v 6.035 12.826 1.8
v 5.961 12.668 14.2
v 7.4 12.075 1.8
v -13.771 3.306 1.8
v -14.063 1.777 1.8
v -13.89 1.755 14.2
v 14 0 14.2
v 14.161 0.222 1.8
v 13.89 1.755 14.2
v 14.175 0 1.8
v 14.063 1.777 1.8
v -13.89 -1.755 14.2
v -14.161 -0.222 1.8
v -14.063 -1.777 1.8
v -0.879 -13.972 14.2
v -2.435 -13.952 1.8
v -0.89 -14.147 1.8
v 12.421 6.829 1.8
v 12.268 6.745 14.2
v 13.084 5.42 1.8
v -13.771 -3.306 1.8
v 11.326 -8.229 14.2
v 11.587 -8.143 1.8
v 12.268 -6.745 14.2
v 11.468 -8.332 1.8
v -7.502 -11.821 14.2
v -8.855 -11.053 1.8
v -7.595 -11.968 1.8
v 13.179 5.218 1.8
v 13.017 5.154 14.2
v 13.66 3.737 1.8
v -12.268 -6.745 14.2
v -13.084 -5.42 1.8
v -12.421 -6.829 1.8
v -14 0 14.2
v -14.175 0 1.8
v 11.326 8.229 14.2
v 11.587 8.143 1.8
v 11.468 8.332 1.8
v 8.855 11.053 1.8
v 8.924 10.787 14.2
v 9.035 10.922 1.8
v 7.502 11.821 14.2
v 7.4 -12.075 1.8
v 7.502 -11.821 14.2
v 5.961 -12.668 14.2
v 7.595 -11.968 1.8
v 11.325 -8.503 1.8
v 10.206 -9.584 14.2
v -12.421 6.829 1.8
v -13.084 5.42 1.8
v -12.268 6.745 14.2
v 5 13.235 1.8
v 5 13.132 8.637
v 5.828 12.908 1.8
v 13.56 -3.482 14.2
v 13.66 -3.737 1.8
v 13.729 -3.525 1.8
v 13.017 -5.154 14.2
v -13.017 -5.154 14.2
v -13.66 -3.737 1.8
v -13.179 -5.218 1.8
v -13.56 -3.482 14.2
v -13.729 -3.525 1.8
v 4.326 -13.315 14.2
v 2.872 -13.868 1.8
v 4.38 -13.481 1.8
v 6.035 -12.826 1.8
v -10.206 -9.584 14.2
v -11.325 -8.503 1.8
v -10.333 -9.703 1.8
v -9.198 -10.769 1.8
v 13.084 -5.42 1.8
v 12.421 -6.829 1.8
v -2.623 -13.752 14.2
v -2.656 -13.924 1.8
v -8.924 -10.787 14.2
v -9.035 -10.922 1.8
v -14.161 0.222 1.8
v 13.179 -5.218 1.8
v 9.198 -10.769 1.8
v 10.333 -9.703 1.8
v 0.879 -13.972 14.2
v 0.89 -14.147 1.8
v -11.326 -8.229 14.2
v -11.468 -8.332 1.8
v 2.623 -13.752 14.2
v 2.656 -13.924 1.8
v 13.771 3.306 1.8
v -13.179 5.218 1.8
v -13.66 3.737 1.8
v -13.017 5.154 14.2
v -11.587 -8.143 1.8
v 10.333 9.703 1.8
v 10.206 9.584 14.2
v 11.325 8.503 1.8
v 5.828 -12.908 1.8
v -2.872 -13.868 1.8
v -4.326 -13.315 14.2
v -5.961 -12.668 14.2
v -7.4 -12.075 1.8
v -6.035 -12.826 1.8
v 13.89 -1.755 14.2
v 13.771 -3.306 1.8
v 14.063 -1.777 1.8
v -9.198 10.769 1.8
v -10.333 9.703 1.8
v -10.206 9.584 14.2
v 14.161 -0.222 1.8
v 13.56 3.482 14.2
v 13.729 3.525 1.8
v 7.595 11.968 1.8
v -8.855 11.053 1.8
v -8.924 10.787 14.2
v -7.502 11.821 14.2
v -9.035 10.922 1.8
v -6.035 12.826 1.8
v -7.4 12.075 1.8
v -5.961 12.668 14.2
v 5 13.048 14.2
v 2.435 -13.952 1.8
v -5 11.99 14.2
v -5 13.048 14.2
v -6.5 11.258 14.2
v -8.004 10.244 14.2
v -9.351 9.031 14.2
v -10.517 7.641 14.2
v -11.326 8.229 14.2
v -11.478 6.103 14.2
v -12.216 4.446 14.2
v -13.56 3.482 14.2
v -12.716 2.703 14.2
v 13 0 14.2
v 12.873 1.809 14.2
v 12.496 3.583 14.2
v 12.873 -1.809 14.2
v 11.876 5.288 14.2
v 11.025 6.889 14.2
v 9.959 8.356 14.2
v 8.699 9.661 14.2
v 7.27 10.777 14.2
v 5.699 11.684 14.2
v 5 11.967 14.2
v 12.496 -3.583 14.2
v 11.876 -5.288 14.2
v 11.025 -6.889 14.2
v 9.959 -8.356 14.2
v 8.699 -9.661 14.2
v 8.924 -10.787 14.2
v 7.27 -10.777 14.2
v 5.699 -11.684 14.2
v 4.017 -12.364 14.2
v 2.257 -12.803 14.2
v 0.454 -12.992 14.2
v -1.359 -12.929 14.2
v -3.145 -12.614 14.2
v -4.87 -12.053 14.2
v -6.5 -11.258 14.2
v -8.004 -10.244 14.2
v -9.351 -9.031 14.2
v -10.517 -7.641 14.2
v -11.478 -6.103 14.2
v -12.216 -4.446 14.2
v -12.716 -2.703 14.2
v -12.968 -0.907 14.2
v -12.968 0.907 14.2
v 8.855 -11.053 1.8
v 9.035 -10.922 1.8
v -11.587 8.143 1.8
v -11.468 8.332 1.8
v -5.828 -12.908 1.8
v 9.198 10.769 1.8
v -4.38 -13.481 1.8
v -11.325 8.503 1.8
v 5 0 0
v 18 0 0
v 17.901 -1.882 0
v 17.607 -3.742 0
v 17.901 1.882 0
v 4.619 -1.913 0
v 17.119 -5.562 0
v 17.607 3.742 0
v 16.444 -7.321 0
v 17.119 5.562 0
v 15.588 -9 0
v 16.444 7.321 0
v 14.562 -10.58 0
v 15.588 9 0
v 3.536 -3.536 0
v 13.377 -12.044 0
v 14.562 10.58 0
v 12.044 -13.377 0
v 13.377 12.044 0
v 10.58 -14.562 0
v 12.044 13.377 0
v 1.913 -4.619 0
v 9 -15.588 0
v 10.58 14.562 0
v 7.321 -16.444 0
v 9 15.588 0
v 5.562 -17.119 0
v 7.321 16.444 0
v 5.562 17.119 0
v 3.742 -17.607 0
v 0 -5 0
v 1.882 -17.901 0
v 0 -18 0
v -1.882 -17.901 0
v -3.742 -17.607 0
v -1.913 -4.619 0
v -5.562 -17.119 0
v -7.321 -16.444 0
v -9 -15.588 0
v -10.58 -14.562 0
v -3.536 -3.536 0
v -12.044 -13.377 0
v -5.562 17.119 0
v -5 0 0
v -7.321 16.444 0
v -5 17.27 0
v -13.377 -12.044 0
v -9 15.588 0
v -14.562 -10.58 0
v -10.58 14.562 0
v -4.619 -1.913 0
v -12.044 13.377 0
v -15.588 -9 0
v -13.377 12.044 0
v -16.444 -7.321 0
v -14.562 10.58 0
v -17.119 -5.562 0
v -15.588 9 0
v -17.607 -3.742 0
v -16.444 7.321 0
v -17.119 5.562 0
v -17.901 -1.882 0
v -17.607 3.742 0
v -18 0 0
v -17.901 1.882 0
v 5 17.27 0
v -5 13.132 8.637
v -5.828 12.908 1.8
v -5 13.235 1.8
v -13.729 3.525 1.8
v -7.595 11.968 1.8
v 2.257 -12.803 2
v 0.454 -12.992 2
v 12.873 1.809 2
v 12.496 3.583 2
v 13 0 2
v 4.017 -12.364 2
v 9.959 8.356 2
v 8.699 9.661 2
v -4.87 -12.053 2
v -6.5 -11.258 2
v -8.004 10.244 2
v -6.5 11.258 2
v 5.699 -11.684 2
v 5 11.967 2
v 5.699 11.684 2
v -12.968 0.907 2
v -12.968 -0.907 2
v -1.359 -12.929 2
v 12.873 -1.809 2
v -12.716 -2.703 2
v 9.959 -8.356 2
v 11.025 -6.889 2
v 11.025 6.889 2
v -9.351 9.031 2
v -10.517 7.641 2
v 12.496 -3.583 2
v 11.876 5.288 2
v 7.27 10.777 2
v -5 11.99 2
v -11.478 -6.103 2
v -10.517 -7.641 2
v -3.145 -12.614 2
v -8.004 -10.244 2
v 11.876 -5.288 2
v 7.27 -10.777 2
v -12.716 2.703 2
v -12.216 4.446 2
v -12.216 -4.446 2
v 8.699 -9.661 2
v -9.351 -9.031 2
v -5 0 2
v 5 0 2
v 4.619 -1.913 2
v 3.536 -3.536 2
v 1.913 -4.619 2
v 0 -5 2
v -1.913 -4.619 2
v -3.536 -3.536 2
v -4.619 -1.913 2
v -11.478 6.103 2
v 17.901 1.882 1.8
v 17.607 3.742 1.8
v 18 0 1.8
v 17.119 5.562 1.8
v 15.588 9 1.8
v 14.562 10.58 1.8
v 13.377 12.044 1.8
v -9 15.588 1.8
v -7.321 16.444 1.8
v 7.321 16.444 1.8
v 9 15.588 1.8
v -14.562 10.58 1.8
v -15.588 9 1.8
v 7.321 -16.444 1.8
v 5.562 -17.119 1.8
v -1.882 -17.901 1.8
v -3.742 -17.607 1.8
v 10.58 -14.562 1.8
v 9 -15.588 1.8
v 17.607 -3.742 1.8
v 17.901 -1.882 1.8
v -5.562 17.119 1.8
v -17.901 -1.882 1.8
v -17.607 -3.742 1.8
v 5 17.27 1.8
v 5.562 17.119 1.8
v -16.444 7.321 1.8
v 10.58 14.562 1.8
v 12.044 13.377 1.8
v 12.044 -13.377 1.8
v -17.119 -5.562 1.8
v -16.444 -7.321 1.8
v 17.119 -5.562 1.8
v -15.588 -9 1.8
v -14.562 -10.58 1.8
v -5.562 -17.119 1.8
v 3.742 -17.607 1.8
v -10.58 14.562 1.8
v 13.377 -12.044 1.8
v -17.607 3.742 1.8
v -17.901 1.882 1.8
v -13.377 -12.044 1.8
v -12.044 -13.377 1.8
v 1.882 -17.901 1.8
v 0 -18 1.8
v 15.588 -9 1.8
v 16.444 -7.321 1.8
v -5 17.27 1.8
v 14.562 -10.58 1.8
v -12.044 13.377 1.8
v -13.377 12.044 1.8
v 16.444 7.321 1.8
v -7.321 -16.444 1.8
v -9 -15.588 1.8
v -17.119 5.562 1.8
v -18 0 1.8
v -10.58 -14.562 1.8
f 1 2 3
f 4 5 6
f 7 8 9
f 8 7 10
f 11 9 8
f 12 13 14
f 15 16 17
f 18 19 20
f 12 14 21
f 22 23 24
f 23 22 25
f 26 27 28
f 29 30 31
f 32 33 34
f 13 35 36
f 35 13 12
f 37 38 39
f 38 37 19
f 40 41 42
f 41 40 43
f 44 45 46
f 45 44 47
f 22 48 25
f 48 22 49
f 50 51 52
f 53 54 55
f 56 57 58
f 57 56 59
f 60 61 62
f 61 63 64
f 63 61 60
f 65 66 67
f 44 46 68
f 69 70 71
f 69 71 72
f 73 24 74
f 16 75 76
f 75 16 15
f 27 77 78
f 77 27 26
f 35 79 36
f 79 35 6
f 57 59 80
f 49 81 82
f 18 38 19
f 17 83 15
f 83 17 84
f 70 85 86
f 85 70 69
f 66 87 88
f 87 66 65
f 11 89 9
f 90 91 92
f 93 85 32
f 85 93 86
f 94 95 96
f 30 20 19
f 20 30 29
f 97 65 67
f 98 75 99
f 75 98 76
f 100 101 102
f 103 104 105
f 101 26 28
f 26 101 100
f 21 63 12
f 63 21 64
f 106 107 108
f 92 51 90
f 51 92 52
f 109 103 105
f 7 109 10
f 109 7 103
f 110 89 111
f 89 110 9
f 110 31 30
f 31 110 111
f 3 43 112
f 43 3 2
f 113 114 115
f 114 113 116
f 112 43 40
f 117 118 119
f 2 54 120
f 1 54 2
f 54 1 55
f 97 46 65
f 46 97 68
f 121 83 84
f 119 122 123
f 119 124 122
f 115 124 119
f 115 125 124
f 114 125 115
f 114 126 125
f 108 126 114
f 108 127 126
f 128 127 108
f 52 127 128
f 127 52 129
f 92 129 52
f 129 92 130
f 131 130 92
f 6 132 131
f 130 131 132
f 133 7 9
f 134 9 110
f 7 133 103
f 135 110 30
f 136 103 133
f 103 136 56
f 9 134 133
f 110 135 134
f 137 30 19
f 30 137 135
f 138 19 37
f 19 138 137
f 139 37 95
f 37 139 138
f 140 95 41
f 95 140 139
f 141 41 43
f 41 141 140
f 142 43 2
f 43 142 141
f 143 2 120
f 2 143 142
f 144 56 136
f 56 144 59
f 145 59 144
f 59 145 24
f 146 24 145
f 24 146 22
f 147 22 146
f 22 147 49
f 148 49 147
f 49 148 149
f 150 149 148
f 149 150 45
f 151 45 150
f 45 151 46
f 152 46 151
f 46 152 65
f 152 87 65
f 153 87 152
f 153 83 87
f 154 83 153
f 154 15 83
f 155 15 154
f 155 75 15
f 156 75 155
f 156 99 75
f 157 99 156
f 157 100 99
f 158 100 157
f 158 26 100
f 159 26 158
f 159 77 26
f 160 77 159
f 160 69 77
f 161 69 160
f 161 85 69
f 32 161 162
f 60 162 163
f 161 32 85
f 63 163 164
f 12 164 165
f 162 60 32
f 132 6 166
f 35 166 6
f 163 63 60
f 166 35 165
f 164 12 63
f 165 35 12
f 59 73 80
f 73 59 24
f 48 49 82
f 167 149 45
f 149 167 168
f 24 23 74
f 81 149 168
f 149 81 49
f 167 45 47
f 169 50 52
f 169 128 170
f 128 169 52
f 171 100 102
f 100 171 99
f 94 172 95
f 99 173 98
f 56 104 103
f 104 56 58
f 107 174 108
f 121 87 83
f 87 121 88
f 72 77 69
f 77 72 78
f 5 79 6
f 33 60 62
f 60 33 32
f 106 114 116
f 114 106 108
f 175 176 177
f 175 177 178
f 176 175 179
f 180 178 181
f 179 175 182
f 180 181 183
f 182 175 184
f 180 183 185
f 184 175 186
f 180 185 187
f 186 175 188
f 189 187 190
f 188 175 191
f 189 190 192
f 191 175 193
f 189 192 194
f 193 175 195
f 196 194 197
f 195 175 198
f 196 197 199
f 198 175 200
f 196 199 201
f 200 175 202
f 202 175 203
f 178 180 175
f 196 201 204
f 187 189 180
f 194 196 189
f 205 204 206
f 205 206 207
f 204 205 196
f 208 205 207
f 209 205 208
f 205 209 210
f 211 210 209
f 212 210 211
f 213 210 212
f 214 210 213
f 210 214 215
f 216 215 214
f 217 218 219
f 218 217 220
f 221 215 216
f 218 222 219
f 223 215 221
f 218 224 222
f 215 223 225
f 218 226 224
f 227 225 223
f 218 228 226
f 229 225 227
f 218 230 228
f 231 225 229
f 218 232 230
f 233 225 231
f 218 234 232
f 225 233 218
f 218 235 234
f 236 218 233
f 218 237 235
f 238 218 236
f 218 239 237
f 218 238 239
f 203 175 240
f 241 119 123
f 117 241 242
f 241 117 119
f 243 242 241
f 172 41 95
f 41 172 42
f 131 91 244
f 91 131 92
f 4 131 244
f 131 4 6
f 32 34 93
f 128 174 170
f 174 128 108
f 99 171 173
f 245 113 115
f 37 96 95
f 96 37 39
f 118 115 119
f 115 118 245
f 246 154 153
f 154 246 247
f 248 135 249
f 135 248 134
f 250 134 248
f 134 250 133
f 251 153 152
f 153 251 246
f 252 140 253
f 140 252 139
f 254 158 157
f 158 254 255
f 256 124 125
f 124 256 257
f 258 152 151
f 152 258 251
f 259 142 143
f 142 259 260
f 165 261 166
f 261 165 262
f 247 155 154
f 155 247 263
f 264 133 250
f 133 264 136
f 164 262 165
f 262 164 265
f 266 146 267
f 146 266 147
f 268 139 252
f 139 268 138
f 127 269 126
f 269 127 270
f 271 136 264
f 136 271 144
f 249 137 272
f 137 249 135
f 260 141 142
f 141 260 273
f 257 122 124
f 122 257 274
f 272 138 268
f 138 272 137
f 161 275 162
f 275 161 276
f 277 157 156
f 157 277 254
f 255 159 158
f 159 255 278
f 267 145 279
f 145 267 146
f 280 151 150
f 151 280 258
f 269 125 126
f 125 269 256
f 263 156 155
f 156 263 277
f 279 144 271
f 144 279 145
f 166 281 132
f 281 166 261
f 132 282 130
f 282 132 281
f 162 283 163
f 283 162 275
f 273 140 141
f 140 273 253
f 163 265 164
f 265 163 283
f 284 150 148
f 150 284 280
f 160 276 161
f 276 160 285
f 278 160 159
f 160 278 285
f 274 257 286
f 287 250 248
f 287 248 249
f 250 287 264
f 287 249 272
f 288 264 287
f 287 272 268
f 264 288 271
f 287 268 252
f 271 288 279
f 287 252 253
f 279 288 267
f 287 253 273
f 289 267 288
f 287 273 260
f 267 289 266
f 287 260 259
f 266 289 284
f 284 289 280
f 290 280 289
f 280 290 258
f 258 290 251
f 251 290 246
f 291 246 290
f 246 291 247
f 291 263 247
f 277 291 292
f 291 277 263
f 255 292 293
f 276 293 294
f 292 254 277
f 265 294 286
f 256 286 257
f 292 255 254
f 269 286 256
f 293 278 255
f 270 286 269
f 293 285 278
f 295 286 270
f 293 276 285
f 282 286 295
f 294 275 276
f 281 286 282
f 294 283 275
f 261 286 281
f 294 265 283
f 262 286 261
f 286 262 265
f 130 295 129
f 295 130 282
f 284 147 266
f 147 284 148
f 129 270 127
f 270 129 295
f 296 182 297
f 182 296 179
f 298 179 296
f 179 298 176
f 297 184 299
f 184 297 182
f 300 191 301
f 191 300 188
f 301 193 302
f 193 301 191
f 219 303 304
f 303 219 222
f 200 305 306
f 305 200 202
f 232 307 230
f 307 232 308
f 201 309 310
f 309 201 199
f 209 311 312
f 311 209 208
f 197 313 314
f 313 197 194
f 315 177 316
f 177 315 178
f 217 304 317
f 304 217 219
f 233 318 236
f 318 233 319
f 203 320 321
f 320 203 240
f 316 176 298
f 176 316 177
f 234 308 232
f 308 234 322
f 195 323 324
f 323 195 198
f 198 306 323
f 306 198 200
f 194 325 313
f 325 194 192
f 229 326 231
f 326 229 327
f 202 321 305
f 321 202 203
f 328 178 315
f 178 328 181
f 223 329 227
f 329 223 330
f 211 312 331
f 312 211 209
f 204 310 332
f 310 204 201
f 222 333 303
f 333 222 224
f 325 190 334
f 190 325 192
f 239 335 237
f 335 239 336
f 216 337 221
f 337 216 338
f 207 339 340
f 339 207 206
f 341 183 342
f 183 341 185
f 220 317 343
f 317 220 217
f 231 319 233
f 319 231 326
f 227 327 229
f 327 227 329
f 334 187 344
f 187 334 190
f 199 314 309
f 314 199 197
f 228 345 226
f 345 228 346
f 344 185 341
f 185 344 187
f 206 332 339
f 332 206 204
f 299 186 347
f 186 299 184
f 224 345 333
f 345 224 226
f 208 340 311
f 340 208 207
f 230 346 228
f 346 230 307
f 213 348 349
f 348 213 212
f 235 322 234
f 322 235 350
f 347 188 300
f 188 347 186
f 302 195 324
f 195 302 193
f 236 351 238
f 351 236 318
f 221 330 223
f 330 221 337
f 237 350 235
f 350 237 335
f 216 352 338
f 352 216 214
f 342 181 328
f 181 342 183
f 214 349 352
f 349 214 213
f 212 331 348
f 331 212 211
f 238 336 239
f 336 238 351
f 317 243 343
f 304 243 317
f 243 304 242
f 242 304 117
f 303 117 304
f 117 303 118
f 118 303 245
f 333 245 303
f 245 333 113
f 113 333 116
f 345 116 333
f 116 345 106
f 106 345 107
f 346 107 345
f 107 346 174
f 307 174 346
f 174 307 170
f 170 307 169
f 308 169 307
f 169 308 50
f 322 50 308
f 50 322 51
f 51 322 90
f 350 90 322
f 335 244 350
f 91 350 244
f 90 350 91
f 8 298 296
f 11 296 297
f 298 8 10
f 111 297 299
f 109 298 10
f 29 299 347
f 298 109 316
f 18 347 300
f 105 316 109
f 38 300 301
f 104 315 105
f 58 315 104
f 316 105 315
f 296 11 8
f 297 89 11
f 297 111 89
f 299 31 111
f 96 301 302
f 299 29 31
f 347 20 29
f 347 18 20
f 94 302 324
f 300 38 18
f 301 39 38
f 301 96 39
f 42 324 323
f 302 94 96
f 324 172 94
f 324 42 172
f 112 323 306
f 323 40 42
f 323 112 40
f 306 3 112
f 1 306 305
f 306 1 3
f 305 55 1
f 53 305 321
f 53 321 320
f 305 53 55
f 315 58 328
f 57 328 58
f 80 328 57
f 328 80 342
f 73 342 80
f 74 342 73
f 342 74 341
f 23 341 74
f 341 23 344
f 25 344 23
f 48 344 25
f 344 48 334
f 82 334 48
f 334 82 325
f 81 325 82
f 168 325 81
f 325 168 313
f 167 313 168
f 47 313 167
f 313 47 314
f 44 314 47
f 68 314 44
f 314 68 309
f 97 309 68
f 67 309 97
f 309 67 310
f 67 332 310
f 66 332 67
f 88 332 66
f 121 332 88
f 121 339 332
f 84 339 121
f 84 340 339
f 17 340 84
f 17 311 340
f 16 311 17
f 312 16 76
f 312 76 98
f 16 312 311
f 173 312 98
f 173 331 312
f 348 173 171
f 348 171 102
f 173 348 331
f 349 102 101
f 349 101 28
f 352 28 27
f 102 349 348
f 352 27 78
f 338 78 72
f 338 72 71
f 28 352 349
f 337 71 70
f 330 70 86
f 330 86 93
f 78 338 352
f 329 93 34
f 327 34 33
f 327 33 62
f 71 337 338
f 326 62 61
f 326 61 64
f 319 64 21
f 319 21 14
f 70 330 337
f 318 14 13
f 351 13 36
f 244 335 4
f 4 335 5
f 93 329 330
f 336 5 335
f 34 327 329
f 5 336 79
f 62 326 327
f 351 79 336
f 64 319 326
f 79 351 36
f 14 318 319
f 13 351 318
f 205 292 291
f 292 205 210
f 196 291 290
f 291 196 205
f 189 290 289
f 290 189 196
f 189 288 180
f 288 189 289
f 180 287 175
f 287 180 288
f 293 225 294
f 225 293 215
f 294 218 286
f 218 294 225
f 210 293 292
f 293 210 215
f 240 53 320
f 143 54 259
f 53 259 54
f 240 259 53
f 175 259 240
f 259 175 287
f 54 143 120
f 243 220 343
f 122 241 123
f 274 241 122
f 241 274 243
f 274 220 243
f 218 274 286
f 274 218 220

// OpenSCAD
difference() {
    union() {
    cylinder(h=1.8, r1=18, r2=18, $fn=60);
    difference() {
        cylinder(h=14.2, r1=14.2, r2=14, $fn=50);
        translate([0,0,2]) cylinder(h=14, r1=13, r2=13, $fn=45);
    }
    }
    union() {
        translate([0,0,-2]) cylinder(h=50, r1=5, r2=5);
        translate([-5,0,-2]) cube([10,30,20]);
    }
}
